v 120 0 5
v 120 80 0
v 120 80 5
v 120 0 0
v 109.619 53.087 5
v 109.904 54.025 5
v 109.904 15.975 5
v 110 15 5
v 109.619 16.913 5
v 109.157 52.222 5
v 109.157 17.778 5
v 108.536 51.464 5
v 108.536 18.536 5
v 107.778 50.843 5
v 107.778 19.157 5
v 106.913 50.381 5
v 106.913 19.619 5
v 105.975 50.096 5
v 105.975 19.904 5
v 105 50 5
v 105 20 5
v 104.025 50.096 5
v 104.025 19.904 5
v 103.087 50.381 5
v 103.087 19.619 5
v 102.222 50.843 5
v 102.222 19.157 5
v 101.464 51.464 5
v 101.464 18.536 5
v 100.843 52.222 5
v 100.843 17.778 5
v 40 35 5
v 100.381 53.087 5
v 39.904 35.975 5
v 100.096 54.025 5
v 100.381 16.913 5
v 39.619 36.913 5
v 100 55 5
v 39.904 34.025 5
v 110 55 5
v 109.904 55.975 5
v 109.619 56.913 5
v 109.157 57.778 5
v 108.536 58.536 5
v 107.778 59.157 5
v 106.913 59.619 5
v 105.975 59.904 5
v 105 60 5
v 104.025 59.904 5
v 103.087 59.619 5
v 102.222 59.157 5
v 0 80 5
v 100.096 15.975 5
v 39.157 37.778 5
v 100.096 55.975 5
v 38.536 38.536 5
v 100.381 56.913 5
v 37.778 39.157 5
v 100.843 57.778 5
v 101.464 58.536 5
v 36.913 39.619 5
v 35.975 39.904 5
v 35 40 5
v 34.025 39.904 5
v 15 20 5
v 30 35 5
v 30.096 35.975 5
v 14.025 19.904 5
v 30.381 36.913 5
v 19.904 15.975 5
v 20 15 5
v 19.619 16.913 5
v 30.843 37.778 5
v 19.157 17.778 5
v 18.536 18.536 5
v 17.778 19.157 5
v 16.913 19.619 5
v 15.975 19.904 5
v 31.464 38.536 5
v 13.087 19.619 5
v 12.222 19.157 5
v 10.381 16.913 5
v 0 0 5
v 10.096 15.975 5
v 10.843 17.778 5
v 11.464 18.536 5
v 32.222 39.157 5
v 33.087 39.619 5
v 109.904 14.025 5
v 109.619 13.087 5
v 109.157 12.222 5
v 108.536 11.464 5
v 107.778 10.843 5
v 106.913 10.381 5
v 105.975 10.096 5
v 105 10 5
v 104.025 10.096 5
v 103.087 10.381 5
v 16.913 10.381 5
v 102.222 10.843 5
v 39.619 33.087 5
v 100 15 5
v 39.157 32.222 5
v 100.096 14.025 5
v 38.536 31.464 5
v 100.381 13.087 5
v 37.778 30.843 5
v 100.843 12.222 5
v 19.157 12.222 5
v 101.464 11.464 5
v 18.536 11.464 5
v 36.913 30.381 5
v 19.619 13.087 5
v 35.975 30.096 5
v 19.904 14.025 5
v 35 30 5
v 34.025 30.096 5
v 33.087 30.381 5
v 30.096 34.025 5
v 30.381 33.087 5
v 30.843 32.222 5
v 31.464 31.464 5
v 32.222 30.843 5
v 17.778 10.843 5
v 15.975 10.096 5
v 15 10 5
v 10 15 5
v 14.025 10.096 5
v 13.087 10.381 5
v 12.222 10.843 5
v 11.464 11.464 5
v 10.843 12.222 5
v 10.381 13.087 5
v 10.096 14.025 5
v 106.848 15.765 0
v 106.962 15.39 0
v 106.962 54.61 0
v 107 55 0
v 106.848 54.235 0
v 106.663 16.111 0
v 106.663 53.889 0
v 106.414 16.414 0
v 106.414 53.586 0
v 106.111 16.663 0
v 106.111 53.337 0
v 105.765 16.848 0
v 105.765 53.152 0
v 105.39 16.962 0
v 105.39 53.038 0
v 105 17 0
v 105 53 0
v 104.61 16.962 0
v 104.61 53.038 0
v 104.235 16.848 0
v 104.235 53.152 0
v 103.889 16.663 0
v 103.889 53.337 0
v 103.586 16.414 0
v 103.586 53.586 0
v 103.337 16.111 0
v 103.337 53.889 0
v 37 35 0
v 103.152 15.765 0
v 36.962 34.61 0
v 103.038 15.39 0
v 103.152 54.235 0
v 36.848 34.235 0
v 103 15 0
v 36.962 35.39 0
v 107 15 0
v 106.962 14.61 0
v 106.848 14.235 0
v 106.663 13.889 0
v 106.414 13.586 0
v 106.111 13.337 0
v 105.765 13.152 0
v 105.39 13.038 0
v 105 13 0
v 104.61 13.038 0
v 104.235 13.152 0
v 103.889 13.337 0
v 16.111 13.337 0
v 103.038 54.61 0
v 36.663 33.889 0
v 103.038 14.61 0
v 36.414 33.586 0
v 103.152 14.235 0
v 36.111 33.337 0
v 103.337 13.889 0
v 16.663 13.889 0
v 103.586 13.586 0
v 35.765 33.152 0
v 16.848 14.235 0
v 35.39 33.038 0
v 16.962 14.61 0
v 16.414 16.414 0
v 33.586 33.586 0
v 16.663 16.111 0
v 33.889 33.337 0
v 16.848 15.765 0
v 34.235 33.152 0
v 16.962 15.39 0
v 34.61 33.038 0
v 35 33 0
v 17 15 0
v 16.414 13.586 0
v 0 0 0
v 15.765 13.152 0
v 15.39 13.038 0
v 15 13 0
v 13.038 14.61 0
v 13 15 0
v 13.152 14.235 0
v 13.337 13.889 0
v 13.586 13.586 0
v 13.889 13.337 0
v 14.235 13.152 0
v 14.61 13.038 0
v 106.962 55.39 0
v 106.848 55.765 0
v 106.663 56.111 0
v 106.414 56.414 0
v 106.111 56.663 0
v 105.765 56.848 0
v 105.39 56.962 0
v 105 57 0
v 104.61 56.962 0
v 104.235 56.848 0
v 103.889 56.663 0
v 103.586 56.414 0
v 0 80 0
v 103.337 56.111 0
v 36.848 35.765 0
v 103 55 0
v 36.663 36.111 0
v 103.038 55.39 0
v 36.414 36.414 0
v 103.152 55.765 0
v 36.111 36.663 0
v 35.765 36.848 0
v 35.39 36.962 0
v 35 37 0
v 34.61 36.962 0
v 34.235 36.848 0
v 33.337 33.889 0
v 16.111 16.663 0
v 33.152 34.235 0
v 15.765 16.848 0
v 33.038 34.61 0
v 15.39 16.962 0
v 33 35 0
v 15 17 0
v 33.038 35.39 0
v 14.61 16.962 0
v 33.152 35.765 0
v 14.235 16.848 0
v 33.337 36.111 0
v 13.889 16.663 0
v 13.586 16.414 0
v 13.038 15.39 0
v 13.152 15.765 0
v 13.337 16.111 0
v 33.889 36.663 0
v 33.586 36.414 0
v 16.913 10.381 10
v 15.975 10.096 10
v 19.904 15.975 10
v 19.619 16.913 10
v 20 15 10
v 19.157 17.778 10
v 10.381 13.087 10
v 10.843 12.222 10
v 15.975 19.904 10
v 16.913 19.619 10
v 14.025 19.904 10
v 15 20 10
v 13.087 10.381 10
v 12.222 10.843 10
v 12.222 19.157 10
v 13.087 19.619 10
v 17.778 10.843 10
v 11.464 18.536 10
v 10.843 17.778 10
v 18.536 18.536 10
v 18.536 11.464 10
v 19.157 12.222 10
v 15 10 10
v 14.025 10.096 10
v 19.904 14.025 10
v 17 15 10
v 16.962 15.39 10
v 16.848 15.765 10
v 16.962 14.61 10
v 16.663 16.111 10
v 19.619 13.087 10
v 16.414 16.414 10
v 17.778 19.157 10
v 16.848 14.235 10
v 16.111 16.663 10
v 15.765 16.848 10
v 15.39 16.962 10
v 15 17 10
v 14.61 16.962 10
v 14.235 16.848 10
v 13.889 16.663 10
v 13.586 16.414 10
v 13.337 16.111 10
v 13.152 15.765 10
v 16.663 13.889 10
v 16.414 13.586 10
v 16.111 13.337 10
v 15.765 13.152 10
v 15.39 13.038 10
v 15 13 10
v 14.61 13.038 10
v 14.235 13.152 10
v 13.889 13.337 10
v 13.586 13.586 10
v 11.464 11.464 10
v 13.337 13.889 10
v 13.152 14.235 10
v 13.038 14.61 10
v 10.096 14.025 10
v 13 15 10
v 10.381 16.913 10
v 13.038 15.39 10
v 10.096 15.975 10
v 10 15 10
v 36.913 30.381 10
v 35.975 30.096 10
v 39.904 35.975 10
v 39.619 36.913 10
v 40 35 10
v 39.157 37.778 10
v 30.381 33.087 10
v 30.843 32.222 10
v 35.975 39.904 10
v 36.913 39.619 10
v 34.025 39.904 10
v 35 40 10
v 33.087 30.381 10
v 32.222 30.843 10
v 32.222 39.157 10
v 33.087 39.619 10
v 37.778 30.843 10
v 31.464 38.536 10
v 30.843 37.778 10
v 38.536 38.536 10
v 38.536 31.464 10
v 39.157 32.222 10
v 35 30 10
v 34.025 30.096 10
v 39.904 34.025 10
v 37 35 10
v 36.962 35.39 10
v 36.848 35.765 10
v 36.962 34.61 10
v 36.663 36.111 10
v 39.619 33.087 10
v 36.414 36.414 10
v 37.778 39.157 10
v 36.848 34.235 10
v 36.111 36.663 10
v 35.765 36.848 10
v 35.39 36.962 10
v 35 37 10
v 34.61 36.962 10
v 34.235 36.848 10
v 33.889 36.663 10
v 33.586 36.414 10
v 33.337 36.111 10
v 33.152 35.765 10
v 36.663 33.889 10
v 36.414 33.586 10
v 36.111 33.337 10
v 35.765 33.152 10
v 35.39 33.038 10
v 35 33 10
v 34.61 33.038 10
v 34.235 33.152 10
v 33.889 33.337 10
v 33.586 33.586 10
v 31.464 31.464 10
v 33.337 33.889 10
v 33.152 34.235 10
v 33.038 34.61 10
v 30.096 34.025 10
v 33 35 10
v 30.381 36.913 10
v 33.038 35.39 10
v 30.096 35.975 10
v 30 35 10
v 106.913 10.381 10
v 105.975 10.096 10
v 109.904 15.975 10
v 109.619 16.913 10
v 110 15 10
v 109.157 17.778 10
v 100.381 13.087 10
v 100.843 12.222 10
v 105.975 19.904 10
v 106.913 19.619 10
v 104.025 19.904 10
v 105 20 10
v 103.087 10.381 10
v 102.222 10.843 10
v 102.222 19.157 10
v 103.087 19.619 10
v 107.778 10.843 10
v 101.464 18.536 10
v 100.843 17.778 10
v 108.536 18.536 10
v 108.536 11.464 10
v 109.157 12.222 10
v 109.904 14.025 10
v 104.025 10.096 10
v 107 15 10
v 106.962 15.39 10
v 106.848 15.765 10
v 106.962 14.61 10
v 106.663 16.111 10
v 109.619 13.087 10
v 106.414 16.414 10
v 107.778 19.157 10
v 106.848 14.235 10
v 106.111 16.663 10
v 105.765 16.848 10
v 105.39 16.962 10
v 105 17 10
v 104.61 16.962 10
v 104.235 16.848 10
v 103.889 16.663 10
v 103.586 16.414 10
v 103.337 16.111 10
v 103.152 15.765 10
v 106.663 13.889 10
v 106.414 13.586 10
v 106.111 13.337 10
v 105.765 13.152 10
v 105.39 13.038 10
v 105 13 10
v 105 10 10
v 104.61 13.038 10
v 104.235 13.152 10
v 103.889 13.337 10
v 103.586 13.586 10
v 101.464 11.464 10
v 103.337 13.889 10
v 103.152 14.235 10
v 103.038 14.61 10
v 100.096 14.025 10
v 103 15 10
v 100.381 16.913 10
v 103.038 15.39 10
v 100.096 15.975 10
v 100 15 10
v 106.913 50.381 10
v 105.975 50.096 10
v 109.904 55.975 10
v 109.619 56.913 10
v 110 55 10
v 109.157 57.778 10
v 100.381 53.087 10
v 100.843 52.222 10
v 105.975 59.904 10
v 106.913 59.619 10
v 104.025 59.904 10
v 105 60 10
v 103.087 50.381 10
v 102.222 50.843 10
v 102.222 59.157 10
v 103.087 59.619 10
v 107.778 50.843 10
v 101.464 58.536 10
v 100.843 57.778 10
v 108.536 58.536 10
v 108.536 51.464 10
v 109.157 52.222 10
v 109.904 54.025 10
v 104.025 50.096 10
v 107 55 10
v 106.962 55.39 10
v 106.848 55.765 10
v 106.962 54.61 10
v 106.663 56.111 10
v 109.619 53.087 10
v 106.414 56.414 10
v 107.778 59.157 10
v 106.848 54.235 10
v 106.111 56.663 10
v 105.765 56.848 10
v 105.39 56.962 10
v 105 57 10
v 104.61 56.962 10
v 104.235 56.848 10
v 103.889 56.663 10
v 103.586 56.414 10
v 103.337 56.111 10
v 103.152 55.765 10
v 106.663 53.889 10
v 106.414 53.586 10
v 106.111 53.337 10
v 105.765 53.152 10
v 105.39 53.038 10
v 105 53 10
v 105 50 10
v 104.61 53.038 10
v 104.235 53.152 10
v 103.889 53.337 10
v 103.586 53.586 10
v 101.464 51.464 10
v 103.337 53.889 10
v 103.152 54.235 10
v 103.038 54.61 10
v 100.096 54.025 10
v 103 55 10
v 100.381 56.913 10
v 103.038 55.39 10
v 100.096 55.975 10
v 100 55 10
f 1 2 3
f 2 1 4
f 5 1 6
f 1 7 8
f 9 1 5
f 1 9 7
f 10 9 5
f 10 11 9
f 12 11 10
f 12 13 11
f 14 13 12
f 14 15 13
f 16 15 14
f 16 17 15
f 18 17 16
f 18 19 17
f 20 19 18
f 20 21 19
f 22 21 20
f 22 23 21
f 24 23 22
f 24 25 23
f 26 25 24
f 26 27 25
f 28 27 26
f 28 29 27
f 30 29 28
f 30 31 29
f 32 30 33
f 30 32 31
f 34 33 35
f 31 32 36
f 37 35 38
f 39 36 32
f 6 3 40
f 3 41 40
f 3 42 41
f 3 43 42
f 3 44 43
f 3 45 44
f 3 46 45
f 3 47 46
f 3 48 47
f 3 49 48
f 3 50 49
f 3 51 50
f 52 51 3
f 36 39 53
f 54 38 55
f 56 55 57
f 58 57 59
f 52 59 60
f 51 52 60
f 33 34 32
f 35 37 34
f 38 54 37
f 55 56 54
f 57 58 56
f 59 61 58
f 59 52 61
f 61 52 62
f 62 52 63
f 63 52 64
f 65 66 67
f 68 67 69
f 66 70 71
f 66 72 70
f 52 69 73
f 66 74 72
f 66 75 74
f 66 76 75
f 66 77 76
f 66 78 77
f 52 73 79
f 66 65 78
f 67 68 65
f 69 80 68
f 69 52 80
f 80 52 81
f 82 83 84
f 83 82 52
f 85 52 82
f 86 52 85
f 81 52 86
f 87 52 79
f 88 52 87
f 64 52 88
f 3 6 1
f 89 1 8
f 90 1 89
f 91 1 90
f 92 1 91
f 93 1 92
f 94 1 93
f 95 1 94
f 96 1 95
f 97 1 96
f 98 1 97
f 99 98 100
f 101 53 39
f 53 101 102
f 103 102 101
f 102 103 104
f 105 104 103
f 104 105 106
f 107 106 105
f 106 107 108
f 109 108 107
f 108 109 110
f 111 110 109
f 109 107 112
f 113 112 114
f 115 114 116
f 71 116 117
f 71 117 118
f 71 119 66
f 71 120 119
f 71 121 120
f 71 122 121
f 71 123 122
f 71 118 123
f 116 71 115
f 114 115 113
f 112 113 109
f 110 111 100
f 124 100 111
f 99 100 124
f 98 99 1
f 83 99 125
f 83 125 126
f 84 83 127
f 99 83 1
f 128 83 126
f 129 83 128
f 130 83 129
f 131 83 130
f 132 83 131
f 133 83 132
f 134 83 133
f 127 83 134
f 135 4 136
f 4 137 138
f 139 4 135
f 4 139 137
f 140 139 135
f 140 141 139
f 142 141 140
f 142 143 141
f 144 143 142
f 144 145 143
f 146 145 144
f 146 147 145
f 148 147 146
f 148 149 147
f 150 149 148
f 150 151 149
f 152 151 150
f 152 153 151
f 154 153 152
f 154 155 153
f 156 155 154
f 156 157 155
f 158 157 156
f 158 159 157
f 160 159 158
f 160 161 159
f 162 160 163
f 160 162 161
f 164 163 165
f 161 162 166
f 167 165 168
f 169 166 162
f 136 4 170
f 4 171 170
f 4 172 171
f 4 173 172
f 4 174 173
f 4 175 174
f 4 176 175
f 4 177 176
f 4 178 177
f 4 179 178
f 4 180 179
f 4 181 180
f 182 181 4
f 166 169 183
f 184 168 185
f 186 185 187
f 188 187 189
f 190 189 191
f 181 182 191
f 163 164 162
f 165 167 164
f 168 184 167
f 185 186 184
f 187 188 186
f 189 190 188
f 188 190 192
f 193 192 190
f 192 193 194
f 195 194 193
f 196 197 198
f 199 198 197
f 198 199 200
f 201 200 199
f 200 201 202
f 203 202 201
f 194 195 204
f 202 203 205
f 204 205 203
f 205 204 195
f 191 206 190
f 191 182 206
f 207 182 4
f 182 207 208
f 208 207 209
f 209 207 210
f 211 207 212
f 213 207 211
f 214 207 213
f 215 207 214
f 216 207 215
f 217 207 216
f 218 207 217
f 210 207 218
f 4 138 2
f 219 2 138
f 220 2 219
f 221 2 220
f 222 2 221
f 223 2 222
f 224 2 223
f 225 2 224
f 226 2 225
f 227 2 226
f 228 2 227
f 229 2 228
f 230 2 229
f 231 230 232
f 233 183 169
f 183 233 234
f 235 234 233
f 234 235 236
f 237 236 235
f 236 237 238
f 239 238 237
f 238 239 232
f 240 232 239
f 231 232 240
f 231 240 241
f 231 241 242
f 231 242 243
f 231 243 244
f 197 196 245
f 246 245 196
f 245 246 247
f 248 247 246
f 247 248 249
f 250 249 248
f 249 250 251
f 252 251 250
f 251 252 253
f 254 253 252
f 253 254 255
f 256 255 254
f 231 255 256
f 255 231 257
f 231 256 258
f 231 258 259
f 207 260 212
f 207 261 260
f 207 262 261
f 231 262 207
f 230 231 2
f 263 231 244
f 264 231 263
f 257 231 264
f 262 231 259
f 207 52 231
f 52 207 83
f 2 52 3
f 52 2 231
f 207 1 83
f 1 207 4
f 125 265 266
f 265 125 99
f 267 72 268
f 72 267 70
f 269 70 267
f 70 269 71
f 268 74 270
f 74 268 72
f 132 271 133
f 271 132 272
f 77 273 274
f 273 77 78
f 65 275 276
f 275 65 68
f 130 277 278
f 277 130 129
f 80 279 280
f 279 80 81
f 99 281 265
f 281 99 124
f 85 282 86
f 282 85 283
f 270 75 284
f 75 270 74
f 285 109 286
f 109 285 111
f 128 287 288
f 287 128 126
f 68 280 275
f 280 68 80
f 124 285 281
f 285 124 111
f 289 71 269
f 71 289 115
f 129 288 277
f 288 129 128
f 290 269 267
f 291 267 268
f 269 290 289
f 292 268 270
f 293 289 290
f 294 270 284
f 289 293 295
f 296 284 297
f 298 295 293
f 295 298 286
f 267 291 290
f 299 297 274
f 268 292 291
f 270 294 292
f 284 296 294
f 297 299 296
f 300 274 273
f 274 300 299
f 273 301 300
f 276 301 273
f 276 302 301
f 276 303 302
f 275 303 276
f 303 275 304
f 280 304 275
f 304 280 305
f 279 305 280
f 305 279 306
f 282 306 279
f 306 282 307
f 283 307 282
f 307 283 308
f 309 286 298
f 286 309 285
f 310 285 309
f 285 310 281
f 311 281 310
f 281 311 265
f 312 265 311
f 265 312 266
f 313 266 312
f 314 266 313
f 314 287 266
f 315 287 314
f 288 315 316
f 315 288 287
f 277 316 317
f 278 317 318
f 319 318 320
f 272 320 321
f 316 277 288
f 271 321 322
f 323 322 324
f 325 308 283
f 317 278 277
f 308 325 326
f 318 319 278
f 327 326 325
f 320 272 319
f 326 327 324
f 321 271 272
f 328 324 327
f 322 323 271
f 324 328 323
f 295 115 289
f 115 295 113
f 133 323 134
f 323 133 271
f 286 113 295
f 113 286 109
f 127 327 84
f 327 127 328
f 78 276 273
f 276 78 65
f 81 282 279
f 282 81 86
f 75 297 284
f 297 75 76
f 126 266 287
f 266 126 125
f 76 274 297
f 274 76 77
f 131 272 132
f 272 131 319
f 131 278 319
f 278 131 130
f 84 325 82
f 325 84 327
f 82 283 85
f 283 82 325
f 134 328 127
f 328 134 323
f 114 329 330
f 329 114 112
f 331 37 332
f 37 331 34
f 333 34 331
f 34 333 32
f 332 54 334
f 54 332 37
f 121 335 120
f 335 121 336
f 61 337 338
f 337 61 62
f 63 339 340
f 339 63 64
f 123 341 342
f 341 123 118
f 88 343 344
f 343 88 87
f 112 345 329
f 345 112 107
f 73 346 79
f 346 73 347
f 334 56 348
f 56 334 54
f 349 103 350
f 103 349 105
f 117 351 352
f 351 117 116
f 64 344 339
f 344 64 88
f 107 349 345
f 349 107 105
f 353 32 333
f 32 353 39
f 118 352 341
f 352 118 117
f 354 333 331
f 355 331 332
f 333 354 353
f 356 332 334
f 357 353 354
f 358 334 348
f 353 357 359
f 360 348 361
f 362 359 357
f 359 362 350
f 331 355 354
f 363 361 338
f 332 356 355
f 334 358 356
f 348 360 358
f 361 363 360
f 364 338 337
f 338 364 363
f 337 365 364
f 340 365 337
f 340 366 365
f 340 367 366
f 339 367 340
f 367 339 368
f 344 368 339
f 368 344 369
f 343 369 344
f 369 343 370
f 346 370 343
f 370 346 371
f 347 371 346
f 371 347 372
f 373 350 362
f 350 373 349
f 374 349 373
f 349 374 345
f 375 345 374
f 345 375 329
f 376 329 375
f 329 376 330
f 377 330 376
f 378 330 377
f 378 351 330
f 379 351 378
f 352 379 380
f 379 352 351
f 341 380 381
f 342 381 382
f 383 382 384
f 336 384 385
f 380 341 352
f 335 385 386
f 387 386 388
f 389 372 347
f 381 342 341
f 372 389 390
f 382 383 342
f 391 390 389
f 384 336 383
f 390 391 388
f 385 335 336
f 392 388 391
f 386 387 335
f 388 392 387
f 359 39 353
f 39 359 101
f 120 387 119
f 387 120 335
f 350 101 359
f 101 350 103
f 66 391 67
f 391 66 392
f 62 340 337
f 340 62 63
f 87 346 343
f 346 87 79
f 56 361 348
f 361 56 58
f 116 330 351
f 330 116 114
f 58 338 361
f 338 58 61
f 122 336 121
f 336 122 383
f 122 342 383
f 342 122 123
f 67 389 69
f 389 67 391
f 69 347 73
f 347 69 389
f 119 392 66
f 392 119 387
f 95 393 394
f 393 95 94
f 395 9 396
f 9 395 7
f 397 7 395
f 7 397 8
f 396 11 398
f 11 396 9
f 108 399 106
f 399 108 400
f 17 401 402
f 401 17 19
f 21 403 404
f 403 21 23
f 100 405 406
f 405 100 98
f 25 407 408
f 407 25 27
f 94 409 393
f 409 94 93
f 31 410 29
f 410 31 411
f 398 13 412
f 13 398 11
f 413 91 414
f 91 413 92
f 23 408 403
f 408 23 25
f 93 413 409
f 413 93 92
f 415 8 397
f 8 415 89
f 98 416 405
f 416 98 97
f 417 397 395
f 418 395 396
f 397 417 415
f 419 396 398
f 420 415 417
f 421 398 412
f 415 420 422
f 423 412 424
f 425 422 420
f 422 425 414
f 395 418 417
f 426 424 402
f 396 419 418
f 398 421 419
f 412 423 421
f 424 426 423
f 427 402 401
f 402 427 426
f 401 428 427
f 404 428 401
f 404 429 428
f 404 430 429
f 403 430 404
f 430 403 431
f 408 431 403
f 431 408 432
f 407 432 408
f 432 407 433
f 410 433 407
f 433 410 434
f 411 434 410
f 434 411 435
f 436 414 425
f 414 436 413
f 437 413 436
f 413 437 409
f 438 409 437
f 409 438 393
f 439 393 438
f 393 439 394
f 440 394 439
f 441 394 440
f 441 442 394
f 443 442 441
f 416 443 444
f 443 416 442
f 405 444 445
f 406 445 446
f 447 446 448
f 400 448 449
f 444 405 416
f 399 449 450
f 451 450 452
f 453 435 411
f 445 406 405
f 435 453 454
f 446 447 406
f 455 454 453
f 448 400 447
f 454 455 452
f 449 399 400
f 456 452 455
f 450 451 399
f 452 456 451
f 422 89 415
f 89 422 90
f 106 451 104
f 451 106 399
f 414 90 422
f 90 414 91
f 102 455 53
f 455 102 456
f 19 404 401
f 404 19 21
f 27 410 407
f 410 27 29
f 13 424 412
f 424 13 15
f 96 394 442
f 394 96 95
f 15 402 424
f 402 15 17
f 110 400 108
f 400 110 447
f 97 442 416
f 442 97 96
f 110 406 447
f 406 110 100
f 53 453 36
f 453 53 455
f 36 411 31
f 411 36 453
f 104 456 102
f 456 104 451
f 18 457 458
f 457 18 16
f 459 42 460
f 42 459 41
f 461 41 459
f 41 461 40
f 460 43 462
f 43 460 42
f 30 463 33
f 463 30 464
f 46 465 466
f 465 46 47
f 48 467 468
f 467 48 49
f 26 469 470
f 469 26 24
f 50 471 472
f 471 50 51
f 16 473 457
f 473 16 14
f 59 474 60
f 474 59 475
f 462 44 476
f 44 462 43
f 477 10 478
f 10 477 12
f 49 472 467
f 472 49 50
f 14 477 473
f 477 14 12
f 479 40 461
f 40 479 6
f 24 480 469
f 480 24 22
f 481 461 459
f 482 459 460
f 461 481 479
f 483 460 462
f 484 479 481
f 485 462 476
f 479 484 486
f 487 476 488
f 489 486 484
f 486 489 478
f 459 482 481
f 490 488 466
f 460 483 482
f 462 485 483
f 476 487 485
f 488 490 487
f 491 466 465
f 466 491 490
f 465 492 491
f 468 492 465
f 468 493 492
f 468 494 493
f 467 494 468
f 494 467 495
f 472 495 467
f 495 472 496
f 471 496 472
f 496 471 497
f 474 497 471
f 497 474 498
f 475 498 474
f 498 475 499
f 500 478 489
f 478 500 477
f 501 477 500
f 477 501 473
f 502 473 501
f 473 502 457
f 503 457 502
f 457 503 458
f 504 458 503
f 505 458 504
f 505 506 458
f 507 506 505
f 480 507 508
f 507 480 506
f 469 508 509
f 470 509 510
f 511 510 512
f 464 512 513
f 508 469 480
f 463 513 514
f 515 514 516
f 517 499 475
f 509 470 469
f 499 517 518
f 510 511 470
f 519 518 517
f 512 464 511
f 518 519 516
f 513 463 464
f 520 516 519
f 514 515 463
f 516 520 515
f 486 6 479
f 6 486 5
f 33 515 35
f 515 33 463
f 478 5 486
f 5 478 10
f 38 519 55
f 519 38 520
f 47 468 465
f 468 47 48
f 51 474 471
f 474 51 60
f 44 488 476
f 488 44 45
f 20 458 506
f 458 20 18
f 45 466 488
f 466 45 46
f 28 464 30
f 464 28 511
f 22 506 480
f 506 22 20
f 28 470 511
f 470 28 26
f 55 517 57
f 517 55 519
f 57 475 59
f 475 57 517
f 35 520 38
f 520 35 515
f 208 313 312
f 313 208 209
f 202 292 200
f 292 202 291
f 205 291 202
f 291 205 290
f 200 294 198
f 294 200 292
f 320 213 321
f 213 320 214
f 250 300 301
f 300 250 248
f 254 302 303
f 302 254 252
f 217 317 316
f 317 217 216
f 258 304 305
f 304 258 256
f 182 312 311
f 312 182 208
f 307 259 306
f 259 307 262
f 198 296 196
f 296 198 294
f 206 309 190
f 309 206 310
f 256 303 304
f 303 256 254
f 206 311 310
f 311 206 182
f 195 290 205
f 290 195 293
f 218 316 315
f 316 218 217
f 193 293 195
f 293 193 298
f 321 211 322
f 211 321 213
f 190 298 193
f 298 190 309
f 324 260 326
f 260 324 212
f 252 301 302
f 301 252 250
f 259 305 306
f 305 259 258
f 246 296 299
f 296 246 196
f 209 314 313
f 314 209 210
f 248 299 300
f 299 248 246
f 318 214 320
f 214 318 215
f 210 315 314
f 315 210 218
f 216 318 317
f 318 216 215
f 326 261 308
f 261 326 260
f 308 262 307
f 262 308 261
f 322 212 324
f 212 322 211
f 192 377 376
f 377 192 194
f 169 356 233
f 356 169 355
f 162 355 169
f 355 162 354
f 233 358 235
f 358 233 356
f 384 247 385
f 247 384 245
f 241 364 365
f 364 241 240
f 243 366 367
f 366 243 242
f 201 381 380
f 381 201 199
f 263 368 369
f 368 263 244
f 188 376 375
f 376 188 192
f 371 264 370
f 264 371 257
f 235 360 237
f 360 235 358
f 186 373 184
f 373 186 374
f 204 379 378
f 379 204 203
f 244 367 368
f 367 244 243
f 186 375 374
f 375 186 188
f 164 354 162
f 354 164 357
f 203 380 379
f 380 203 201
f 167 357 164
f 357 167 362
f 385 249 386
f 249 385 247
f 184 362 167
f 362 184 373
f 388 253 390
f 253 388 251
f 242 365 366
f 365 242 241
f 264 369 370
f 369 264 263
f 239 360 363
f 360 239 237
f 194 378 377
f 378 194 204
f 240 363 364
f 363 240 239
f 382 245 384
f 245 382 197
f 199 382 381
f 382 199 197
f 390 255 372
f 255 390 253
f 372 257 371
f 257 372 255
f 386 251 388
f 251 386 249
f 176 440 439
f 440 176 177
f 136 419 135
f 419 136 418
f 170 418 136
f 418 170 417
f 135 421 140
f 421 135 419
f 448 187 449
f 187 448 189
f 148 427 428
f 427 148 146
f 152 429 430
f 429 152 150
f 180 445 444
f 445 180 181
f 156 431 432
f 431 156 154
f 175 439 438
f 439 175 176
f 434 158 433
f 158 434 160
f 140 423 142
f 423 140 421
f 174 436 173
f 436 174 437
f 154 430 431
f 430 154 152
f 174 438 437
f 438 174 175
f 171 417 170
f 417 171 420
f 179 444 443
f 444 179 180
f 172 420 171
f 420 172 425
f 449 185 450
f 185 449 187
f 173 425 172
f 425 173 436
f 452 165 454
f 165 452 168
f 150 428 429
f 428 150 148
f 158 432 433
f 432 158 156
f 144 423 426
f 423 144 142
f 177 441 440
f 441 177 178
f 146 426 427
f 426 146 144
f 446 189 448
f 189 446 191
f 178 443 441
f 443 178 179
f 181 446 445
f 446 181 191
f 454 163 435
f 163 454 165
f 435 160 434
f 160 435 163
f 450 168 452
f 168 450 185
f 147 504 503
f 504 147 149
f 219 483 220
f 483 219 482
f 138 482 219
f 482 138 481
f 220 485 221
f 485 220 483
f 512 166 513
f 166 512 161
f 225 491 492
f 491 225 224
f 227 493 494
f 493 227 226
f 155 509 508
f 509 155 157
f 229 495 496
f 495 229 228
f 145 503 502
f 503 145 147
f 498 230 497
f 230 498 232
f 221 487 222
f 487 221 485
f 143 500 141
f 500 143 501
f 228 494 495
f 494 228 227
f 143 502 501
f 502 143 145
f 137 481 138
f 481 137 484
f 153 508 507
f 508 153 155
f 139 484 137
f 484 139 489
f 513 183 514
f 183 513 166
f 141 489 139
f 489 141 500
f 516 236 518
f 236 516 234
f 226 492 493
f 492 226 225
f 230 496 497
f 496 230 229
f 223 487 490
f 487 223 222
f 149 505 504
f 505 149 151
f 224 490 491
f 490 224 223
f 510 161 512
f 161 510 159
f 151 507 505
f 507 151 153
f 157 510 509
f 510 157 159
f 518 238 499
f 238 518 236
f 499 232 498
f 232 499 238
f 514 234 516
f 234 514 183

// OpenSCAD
$fn = 32;

// ----------------------------------------------------------------------
// Boss field: plate with bosses at given coordinates
// ----------------------------------------------------------------------

// --- parameters (mm) ---
plate_l = 120;            // plate length, X
plate_w = 80;             // plate width, Y
plate_t = 5;              // plate thickness, Z
boss_d = 10;              // boss diameter
boss_h = 5;               // boss height above the plate
bore_d = 4;               // boss bore

total_h = plate_t + boss_h;  // overall height

difference() {
  union() {
    cube([plate_l, plate_w, plate_t]);
    translate([15, 15, plate_t]) cylinder(h = boss_h, d = boss_d);
    translate([35, 35, plate_t]) cylinder(h = boss_h, d = boss_d);
    translate([105, 15, plate_t]) cylinder(h = boss_h, d = boss_d);
    translate([105, 55, plate_t]) cylinder(h = boss_h, d = boss_d);
  }
  translate([15, 15, -1]) cylinder(h = total_h + 2, d = bore_d);
  translate([35, 35, -1]) cylinder(h = total_h + 2, d = bore_d);
  translate([105, 15, -1]) cylinder(h = total_h + 2, d = bore_d);
  translate([105, 55, -1]) cylinder(h = total_h + 2, d = bore_d);
}
